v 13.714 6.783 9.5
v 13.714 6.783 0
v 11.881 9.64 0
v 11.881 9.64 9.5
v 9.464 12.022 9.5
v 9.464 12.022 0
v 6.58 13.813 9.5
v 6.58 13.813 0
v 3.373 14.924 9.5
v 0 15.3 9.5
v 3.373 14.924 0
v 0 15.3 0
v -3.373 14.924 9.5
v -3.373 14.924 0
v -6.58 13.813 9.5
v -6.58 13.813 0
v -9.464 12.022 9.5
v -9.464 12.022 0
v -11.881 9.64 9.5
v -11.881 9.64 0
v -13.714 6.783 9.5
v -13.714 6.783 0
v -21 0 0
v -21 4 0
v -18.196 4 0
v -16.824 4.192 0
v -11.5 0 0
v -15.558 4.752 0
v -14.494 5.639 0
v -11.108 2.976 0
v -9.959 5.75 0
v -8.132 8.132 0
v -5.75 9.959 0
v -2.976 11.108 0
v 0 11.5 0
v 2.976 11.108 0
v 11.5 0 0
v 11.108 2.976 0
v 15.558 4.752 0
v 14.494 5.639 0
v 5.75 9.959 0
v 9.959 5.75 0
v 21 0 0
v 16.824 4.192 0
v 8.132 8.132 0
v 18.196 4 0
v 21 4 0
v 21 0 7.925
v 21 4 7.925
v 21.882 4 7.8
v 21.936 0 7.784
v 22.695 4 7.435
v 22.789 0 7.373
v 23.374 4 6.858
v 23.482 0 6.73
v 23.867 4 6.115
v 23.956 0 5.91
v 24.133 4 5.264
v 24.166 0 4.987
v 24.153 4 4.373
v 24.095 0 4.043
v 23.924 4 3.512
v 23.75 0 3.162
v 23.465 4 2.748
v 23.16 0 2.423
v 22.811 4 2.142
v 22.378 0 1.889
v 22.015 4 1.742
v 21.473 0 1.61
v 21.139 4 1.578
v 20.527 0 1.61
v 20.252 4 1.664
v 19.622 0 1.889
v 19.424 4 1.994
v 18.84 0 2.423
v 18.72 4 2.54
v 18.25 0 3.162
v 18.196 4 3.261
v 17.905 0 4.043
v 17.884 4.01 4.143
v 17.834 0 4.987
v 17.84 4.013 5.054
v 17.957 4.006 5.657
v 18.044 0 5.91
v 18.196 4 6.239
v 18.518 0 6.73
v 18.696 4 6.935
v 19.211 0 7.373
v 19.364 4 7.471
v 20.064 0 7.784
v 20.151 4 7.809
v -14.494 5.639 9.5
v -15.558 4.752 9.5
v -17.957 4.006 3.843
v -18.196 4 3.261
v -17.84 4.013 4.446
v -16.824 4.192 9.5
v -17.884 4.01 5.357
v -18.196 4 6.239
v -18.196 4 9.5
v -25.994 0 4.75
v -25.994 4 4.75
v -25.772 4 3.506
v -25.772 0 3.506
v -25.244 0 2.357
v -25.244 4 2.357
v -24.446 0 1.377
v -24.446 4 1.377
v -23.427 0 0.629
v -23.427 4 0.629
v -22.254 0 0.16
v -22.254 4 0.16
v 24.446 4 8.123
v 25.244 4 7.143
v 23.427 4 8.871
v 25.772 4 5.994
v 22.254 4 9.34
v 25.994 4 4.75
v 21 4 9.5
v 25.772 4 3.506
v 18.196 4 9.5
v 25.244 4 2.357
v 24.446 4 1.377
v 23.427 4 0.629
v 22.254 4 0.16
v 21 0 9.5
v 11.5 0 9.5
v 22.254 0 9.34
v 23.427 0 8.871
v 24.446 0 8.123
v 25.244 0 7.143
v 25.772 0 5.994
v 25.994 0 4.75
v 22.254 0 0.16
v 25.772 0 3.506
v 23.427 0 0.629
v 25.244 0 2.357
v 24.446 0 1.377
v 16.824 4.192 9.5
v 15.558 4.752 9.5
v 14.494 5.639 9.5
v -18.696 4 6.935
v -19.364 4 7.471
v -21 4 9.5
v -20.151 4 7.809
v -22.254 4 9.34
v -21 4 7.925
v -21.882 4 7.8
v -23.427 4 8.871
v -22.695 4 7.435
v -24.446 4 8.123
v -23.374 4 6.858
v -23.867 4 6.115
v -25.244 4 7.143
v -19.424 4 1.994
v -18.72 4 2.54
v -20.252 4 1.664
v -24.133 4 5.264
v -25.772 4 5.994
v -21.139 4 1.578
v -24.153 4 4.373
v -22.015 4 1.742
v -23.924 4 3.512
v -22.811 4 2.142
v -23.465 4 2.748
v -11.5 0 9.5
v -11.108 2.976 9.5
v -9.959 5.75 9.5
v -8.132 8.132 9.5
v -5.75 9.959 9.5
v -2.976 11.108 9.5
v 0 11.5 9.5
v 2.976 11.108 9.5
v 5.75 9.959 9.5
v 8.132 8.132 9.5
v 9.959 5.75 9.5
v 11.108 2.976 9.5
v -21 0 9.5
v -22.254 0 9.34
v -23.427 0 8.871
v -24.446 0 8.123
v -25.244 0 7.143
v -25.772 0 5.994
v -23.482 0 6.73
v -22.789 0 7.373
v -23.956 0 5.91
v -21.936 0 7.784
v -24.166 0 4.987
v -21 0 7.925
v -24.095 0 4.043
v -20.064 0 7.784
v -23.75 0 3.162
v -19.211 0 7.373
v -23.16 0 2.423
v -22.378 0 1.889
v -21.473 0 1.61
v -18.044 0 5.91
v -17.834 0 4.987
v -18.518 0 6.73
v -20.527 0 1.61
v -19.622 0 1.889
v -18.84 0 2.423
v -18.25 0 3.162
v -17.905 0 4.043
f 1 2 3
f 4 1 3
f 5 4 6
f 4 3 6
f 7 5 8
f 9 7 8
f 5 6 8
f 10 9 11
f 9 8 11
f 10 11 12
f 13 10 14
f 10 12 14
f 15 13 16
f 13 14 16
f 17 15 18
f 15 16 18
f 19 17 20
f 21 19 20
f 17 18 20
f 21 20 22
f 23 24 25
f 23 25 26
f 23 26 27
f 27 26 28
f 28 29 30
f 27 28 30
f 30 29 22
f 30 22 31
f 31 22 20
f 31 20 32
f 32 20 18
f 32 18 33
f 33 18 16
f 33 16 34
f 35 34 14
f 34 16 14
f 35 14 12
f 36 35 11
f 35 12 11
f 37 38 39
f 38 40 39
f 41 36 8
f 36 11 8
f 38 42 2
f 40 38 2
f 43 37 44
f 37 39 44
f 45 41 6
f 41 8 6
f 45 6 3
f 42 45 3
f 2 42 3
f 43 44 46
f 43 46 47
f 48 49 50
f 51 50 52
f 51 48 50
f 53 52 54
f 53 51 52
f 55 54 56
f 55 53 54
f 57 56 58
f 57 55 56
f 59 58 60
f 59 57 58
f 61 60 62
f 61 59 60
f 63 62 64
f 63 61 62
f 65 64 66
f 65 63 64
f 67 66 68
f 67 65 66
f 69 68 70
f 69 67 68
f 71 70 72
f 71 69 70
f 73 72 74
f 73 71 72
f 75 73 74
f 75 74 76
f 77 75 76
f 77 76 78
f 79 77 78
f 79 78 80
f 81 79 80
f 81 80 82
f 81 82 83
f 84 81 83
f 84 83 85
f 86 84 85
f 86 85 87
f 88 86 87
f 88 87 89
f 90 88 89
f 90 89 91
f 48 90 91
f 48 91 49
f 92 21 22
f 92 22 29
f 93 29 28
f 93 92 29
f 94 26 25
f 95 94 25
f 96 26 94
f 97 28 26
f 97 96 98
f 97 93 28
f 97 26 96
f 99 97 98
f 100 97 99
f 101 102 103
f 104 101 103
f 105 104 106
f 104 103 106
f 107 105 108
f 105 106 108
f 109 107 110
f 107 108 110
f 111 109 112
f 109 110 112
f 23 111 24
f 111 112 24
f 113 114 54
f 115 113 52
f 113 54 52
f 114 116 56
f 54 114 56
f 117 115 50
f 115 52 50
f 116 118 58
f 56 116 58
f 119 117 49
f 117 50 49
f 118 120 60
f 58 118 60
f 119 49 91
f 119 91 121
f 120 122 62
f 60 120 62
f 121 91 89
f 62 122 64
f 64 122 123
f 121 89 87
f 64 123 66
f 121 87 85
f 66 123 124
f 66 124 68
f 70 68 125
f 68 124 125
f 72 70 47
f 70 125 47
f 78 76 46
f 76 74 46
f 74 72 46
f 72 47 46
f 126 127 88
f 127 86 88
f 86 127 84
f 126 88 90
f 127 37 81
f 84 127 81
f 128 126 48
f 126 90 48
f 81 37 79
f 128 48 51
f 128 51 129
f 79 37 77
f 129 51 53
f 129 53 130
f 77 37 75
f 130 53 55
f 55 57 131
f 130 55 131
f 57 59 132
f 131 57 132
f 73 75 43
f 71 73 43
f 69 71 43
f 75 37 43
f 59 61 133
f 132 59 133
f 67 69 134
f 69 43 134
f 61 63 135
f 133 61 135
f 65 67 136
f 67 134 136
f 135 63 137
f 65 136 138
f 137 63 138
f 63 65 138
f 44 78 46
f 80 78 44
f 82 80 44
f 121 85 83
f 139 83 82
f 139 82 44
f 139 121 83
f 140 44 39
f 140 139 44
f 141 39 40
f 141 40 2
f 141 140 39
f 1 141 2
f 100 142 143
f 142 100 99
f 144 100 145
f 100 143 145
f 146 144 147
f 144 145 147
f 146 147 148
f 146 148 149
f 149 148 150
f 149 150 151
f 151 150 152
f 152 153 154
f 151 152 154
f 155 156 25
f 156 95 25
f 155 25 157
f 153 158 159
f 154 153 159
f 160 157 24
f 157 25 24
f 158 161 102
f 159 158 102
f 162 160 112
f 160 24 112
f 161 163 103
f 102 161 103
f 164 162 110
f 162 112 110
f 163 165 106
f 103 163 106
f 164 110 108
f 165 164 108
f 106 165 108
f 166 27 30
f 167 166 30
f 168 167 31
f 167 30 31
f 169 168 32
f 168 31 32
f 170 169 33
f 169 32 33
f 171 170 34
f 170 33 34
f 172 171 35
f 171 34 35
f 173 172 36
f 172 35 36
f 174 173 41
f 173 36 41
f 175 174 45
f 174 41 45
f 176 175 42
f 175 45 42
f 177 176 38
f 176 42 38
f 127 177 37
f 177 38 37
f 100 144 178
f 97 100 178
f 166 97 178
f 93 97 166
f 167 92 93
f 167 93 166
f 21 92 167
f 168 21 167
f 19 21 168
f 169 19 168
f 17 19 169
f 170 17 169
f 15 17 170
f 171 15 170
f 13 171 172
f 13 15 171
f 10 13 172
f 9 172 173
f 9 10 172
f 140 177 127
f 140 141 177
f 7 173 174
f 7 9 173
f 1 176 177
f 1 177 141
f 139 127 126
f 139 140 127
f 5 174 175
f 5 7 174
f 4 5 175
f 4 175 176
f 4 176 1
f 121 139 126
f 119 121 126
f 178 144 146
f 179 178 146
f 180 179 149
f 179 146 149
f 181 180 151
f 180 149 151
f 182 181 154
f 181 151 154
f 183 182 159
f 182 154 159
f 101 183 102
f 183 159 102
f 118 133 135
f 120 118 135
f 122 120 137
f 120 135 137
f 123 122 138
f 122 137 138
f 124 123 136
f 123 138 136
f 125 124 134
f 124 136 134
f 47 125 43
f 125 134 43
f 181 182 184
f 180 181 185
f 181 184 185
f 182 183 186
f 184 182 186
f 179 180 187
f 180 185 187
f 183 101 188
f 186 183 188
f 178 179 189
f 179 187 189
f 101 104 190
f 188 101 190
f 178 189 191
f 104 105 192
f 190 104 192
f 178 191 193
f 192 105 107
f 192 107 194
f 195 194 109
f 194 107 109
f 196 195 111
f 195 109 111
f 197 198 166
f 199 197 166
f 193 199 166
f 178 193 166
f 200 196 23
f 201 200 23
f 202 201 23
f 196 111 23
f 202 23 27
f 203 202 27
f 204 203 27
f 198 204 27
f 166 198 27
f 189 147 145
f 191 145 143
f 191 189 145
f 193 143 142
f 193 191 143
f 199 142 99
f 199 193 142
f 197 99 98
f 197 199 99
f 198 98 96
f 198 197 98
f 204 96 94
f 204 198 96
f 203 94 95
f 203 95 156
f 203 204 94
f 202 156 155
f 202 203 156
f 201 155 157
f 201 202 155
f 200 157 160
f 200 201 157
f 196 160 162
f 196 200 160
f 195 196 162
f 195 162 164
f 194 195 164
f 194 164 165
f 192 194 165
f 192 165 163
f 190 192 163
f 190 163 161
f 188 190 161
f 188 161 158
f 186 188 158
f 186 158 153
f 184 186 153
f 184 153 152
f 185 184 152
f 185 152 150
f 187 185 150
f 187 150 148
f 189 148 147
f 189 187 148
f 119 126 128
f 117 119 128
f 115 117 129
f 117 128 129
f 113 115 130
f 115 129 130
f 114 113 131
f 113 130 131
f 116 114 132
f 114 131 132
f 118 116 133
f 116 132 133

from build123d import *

# Parameters (mm, degrees)
BOSS_EXTRUDE1_DEPTH     = 9.5
FILLET5_R               = 5
CUT_EXTRUDE1_DEPTH      = 30.898829409
CUT_EXTRUDE1_DEPTH_BACK = 30.898829409
SKETCH2_R               = 3.175
FILLET1_R               = 5


with BuildPart() as part:
    # Sketch1 → Boss-Extrude1 (new body)
    with BuildSketch(Plane.XY):
        with BuildLine():
            Line((11.5, 0), (26, 0))
            Line((26, 0), (26, 4))
            Line((26, 4), (14.76787053, 4))
            ThreePointArc((14.76787053, 4), (0, 15.3), (-14.76787053, 4))
            Line((-14.76787053, 4), (-26, 4))
            Line((-26, 4), (-26, 0))
            Line((-26, 0), (-11.5, 0))
            ThreePointArc((-11.5, 0), (0, 11.5), (11.5, 0))
        make_face()
    extrude(amount=BOSS_EXTRUDE1_DEPTH)

    # Fillet5
    fillet5_edges = [part.edges().sort_by_distance(p)[0] for p in [
        (-14.76787053, 4, 4.75),
        (14.76787053, 4, 4.75),
    ]]
    fillet(fillet5_edges, radius=FILLET5_R)

    # Sketch2 → Cut-Extrude1 (cut, two sides: drawn at the far end of the back side and taken through both)
    with BuildSketch(Plane(origin=(0, 4, 0), x_dir=(1, 0, 0), z_dir=(0, 1, 0)).offset(-CUT_EXTRUDE1_DEPTH_BACK)):
        with Locations(Location((-21, -4.75, 0), (0, 0, 270))):
            Circle(SKETCH2_R)
        with Locations(Location((21, -4.75, 0), (0, 0, 270))):
            Circle(SKETCH2_R)
    extrude(amount=CUT_EXTRUDE1_DEPTH + CUT_EXTRUDE1_DEPTH_BACK, mode=Mode.SUBTRACT)

    # Fillet1
    # the kernel refuses this fillet: 5 mm, written as the material it takes off along each edge
    with BuildSketch(Plane(origin=(-26, 16.5, 0), x_dir=(1, 0, 0), z_dir=(0, -1, 0))) as fillet1_piece_1:
        with BuildLine():
            CenterArc((FILLET1_R, FILLET1_R), FILLET1_R, 180, 90)
            Line((0, FILLET1_R), (0, 0))
            Line((0, 0), (FILLET1_R, 0))
        make_face()
    extrude(amount=29, mode=Mode.SUBTRACT)
    with BuildSketch(Plane(origin=(26, -12.5, 0), x_dir=(0, 0, 1), z_dir=(0, 1, 0)), Plane(origin=(26, -12.5, 9.5), x_dir=(-1, 0, 0), z_dir=(0, 1, 0)), Plane(origin=(-26, 16.5, 9.5), x_dir=(1, 0, 0), z_dir=(0, -1, 0))) as fillet1_piece_2:
        with BuildLine():
            CenterArc((FILLET1_R, -FILLET1_R), FILLET1_R, 90, 90)
            Line((0, -FILLET1_R), (0, 0))
            Line((0, 0), (FILLET1_R, 0))
        make_face()
    extrude(amount=29, mode=Mode.SUBTRACT)


solid = part.part
